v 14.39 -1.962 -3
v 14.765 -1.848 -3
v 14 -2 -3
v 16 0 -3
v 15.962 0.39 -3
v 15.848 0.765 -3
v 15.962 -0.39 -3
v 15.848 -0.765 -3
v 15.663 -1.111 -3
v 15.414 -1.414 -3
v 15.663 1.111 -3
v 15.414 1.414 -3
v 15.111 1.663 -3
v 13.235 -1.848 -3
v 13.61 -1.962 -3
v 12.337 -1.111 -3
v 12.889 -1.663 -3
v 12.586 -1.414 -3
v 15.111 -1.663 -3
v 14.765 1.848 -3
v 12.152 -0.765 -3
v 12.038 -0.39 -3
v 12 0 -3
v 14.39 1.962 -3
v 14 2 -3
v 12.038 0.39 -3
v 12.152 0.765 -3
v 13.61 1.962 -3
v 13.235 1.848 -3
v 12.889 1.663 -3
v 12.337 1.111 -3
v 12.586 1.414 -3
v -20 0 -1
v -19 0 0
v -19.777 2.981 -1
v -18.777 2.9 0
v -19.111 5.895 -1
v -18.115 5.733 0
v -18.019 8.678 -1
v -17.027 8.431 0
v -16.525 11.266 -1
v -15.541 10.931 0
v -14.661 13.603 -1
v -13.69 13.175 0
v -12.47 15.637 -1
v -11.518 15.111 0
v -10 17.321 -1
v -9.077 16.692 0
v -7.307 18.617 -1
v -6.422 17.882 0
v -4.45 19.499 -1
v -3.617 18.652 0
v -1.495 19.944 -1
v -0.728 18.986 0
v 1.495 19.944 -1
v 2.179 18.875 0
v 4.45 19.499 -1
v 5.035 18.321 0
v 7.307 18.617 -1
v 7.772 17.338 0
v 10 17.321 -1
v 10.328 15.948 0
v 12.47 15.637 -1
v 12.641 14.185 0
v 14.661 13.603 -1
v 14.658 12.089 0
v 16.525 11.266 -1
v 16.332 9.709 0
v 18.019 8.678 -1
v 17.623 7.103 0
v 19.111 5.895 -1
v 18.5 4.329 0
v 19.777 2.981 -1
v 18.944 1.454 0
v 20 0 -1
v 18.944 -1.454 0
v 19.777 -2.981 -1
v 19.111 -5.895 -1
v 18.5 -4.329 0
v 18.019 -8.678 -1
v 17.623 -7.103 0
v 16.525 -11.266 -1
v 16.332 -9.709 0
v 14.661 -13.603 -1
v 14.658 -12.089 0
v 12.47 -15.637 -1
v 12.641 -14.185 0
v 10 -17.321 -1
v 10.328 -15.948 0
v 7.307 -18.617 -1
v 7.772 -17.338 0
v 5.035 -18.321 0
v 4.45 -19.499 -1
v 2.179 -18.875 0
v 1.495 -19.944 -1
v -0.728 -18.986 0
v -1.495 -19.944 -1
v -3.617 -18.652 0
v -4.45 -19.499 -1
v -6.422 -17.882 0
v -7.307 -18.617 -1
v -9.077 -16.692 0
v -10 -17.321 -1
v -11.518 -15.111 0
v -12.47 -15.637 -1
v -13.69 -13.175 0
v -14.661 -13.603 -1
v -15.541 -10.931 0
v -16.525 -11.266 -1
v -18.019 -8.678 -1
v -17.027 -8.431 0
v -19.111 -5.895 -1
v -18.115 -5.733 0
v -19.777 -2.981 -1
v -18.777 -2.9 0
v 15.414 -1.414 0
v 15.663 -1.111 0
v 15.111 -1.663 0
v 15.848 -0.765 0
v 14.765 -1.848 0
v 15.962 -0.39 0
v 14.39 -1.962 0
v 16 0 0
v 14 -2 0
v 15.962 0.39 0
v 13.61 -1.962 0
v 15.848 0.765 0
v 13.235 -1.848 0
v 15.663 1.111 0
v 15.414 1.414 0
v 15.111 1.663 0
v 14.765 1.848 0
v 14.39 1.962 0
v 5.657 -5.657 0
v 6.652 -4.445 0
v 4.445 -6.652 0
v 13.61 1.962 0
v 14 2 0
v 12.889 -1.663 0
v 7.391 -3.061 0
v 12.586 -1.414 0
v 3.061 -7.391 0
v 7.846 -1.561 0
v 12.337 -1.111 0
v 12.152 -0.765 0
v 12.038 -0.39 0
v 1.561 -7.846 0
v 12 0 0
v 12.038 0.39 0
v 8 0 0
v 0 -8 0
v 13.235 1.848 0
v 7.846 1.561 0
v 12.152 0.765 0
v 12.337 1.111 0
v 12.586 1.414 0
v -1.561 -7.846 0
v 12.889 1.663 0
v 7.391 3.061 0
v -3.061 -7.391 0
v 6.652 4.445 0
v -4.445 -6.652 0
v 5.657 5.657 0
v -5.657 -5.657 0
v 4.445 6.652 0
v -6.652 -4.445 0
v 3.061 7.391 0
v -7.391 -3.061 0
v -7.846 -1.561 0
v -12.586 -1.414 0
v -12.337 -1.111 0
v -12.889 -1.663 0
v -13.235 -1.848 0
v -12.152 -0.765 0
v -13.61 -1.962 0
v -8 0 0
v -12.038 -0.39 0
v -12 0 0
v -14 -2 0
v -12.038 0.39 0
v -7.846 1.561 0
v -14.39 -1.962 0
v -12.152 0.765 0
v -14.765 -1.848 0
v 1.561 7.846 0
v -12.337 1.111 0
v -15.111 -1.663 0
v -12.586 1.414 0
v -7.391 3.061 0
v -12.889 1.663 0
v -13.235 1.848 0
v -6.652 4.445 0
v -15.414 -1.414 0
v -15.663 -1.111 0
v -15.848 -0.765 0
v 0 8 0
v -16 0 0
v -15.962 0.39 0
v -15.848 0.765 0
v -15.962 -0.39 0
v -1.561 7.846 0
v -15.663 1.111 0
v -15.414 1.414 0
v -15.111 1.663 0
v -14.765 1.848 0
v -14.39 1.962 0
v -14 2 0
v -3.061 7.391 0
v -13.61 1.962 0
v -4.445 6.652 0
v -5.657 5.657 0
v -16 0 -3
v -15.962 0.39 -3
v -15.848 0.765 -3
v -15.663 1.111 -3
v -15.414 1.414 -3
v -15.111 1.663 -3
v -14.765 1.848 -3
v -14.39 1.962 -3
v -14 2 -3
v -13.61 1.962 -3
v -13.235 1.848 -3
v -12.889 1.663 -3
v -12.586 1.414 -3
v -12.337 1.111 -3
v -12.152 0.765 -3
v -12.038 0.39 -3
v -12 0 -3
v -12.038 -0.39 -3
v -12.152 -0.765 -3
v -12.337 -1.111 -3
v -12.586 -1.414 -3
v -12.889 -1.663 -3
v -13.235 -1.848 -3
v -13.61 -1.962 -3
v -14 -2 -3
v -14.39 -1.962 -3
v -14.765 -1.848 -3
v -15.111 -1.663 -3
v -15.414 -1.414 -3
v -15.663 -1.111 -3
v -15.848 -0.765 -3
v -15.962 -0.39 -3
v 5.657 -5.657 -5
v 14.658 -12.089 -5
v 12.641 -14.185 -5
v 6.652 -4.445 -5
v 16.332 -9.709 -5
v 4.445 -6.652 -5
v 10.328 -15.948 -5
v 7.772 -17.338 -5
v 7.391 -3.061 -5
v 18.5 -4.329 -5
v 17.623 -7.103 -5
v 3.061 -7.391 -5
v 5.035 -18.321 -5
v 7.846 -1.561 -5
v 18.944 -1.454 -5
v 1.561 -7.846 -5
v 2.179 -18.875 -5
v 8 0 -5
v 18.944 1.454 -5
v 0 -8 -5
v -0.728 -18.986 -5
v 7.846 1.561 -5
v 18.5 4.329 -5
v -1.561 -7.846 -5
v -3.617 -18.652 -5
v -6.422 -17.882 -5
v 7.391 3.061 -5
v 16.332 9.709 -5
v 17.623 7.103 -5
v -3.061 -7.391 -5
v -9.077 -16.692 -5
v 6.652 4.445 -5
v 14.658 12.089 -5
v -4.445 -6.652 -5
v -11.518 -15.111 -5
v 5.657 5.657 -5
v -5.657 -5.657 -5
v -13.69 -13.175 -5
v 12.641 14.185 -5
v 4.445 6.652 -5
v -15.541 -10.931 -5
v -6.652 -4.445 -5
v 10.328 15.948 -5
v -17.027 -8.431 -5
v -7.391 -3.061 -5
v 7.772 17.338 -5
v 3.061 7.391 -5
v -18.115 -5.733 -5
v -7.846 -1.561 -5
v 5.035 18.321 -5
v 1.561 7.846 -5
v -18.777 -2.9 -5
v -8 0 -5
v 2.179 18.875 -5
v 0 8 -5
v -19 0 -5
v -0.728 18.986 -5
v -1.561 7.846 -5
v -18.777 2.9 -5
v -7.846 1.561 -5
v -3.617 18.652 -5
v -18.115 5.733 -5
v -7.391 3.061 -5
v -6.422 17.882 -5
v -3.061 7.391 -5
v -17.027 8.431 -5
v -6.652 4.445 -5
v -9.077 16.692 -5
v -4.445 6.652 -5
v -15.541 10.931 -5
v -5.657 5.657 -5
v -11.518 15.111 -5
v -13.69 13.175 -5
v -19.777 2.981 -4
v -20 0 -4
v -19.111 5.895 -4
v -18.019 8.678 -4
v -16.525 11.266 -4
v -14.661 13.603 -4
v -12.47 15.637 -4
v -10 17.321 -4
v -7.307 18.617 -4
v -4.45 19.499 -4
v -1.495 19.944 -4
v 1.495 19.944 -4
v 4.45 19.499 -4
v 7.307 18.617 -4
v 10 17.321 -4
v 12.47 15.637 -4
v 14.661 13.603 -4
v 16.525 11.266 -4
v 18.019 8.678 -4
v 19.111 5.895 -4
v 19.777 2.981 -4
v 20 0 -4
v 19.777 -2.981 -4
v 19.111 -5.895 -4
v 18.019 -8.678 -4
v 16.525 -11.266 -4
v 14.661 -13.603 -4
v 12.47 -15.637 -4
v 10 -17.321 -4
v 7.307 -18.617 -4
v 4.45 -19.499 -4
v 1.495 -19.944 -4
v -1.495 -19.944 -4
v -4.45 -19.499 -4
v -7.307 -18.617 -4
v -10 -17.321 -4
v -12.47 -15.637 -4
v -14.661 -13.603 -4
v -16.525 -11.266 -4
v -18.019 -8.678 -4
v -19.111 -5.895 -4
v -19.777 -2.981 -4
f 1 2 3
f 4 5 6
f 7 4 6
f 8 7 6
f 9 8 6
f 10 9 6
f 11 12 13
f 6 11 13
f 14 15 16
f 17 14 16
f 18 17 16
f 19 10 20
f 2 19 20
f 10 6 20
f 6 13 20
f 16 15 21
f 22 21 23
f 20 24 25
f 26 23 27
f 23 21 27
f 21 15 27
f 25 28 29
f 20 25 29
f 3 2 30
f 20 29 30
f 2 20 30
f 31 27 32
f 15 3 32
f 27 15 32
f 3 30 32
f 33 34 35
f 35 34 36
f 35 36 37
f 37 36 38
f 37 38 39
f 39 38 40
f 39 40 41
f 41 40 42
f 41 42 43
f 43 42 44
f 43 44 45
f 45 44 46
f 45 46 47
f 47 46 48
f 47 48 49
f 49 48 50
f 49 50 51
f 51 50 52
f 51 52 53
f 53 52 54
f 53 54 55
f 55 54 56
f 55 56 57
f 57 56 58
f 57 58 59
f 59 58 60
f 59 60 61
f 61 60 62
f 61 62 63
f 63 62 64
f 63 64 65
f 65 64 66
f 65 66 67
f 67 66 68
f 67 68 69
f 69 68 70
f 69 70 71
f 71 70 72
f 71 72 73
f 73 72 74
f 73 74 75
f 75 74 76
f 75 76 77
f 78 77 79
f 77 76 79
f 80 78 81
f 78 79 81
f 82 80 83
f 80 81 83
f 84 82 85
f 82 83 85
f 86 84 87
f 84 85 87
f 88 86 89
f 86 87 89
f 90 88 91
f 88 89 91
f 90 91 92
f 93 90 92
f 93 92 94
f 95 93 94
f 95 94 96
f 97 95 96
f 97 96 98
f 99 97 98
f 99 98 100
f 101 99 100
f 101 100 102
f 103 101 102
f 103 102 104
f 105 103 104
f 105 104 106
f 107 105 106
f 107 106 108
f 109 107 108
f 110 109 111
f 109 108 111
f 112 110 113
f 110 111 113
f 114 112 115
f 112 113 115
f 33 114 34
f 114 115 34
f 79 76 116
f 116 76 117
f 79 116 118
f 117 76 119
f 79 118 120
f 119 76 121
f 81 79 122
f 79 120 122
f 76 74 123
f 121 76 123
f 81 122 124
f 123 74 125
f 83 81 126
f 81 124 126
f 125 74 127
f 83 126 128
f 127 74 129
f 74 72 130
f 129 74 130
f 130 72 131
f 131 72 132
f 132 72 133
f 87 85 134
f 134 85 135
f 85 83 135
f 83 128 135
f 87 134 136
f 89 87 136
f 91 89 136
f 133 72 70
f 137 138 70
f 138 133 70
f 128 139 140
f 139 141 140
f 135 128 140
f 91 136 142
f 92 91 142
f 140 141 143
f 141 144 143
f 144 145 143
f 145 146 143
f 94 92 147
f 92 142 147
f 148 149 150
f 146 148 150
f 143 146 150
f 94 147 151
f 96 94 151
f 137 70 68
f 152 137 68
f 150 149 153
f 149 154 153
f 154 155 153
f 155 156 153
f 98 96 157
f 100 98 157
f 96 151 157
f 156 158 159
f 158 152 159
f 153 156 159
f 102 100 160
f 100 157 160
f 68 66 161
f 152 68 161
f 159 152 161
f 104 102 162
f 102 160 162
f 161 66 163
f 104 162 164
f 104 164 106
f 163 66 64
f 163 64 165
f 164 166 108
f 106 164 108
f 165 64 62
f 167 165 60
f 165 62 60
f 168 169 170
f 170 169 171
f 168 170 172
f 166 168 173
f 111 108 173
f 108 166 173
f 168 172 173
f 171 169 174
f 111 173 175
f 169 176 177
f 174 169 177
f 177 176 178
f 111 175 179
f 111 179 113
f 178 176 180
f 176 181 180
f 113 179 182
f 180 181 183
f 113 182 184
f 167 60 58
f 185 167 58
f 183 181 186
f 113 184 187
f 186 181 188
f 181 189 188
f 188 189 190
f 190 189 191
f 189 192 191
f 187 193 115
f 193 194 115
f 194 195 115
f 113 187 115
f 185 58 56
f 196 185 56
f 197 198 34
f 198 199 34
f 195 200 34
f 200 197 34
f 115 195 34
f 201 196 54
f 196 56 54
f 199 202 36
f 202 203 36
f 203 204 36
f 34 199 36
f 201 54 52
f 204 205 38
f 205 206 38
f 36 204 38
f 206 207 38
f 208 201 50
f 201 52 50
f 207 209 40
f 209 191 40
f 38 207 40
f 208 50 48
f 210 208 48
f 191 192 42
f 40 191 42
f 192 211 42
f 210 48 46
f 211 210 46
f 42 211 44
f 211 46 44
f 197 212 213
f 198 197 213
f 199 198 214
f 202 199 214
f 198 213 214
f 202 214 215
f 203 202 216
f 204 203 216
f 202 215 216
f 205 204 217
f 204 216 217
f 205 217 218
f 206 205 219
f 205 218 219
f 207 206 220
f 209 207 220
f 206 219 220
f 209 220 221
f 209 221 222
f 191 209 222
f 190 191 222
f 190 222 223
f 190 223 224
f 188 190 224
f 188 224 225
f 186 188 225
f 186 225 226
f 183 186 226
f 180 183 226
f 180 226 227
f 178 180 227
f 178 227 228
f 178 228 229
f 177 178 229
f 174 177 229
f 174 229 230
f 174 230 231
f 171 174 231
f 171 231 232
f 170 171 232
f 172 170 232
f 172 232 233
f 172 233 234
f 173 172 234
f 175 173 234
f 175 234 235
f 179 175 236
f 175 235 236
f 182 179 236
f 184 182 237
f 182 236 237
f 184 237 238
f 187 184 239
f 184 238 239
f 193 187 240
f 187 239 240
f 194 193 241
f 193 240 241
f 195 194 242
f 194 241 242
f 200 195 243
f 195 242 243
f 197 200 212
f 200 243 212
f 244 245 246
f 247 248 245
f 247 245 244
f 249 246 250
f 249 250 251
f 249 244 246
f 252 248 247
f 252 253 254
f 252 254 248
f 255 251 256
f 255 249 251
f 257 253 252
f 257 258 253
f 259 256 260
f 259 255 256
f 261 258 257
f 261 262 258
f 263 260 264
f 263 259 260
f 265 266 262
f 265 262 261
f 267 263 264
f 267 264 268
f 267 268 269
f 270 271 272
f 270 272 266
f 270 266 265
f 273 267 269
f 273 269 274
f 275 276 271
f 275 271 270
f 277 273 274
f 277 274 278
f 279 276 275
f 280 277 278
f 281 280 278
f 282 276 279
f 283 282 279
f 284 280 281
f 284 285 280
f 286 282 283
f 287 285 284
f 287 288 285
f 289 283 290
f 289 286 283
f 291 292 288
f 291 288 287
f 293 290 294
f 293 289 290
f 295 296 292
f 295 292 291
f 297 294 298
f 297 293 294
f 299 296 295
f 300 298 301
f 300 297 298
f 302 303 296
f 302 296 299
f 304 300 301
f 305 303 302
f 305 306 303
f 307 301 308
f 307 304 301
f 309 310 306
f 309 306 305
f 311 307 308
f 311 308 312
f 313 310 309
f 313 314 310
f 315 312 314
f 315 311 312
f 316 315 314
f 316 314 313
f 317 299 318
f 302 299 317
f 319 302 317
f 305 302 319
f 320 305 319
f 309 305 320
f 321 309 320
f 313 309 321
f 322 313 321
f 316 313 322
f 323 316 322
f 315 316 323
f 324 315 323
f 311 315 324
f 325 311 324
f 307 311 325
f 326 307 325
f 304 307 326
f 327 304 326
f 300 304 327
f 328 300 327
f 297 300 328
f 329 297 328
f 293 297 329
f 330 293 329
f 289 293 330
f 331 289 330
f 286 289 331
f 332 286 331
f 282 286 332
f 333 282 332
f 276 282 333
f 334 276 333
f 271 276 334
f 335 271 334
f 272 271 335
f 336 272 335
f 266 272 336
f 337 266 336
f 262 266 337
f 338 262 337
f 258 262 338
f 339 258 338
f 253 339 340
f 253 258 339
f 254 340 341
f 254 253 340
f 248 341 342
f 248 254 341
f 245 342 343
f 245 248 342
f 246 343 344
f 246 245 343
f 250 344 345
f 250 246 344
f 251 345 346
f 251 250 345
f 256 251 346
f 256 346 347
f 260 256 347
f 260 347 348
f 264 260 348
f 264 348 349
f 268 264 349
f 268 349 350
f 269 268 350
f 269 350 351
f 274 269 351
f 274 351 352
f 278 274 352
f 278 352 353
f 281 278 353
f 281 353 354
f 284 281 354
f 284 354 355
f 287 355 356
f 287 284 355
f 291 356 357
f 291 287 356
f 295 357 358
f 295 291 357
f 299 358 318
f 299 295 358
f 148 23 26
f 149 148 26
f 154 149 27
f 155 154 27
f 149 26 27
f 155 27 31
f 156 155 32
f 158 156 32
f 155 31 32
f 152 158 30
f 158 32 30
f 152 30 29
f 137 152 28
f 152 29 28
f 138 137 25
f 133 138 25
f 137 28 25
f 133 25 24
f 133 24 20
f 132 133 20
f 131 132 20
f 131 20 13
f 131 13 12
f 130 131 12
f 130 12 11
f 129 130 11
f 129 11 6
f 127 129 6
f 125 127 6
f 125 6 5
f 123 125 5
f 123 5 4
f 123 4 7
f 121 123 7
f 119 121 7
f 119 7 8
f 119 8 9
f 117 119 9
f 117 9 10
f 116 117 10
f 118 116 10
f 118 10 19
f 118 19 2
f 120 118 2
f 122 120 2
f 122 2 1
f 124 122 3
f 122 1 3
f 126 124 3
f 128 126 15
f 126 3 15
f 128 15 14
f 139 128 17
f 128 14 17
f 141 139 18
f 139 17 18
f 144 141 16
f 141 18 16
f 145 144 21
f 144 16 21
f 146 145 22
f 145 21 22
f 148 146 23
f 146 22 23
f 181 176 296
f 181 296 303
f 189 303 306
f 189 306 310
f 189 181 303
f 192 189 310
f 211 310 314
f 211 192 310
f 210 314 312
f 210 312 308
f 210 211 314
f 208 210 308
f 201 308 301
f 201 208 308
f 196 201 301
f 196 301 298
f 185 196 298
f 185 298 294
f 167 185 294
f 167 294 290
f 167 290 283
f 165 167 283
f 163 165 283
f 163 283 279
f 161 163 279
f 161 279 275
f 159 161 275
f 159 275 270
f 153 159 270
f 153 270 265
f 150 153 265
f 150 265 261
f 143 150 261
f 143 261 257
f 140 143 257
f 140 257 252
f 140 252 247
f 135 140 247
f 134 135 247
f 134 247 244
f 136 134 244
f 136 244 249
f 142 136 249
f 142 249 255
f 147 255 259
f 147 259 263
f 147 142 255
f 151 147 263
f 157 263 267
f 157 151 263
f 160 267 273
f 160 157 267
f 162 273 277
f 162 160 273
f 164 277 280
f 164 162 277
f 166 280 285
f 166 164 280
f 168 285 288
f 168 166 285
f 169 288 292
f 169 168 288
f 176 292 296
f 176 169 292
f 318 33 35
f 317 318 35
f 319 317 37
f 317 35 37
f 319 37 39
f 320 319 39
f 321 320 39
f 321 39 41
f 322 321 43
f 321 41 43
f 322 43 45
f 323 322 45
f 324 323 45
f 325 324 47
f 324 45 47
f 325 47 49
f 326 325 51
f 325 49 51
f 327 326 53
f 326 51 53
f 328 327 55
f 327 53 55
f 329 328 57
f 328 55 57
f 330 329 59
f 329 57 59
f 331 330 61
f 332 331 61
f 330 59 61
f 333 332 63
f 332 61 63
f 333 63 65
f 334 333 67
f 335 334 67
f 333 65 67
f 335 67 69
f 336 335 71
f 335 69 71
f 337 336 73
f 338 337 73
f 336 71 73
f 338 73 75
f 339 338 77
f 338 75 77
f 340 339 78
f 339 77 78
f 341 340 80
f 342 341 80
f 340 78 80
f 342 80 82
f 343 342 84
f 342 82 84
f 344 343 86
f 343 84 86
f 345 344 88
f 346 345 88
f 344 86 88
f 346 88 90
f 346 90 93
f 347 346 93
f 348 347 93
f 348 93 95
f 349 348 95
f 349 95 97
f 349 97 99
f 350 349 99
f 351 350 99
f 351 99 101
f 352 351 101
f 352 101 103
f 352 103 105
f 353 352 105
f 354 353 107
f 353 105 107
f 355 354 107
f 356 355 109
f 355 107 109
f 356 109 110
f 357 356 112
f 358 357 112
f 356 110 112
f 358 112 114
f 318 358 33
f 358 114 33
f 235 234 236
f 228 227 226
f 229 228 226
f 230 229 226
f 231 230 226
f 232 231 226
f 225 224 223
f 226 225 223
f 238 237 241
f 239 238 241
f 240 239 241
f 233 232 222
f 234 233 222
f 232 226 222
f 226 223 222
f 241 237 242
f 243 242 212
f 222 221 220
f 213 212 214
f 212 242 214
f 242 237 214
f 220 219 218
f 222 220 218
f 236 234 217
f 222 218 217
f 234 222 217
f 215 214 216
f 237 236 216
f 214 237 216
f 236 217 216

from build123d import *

# Parameters (mm, degrees)
SKETCH1_R           = 12.5
SKETCH1_R_2         = 8
BOSS_EXTRUDE1_DEPTH = 2.5
SKETCH3_R           = 20
SKETCH3_R_2         = 8
BOSS_EXTRUDE3_DEPTH = 5
CHAMFER2_SIZE       = 1
SKETCH5_R           = 12.5
CUT_EXTRUDE1_DEPTH  = 10
CUT_EXTRUDE2_START  = -2
SKETCH6_R           = 2
CUT_EXTRUDE2_DEPTH  = 5


with BuildPart() as part:
    # Sketch1 → Boss-Extrude1 (new body)
    with BuildSketch(Plane.XY):
        Circle(SKETCH1_R)
        Circle(SKETCH1_R_2, mode=Mode.SUBTRACT)
    extrude(amount=BOSS_EXTRUDE1_DEPTH)

    # Sketch3 → Boss-Extrude3 (add)
    with BuildSketch(Plane(origin=(0, 0, 0), x_dir=(-1, 0, 0), z_dir=(0, 0, -1))):
        Circle(SKETCH3_R)
        Circle(SKETCH3_R_2, mode=Mode.SUBTRACT)
    extrude(amount=BOSS_EXTRUDE3_DEPTH)

    # Chamfer2
    chamfer2_edges = [part.edges().sort_by_distance(p)[0] for p in [
        (20, 0, 0),
        (20, 0, -5),
    ]]
    chamfer(chamfer2_edges, length=CHAMFER2_SIZE)

    # Sketch5 → Cut-Extrude1 (cut)
    with BuildSketch(Plane.XY):
        Circle(SKETCH5_R)
    extrude(amount=CUT_EXTRUDE1_DEPTH, mode=Mode.SUBTRACT)

    # Sketch6 → Cut-Extrude2 (cut)
    with BuildSketch(Plane(origin=(0, 0, -5), x_dir=(-1, 0, 0), z_dir=(0, 0, -1)).offset(CUT_EXTRUDE2_START)):
        with Locations((14, 0)):
            Circle(SKETCH6_R)
        with Locations((-14, 0)):
            Circle(SKETCH6_R)
    extrude(amount=-CUT_EXTRUDE2_DEPTH, mode=Mode.SUBTRACT)


solid = part.part
